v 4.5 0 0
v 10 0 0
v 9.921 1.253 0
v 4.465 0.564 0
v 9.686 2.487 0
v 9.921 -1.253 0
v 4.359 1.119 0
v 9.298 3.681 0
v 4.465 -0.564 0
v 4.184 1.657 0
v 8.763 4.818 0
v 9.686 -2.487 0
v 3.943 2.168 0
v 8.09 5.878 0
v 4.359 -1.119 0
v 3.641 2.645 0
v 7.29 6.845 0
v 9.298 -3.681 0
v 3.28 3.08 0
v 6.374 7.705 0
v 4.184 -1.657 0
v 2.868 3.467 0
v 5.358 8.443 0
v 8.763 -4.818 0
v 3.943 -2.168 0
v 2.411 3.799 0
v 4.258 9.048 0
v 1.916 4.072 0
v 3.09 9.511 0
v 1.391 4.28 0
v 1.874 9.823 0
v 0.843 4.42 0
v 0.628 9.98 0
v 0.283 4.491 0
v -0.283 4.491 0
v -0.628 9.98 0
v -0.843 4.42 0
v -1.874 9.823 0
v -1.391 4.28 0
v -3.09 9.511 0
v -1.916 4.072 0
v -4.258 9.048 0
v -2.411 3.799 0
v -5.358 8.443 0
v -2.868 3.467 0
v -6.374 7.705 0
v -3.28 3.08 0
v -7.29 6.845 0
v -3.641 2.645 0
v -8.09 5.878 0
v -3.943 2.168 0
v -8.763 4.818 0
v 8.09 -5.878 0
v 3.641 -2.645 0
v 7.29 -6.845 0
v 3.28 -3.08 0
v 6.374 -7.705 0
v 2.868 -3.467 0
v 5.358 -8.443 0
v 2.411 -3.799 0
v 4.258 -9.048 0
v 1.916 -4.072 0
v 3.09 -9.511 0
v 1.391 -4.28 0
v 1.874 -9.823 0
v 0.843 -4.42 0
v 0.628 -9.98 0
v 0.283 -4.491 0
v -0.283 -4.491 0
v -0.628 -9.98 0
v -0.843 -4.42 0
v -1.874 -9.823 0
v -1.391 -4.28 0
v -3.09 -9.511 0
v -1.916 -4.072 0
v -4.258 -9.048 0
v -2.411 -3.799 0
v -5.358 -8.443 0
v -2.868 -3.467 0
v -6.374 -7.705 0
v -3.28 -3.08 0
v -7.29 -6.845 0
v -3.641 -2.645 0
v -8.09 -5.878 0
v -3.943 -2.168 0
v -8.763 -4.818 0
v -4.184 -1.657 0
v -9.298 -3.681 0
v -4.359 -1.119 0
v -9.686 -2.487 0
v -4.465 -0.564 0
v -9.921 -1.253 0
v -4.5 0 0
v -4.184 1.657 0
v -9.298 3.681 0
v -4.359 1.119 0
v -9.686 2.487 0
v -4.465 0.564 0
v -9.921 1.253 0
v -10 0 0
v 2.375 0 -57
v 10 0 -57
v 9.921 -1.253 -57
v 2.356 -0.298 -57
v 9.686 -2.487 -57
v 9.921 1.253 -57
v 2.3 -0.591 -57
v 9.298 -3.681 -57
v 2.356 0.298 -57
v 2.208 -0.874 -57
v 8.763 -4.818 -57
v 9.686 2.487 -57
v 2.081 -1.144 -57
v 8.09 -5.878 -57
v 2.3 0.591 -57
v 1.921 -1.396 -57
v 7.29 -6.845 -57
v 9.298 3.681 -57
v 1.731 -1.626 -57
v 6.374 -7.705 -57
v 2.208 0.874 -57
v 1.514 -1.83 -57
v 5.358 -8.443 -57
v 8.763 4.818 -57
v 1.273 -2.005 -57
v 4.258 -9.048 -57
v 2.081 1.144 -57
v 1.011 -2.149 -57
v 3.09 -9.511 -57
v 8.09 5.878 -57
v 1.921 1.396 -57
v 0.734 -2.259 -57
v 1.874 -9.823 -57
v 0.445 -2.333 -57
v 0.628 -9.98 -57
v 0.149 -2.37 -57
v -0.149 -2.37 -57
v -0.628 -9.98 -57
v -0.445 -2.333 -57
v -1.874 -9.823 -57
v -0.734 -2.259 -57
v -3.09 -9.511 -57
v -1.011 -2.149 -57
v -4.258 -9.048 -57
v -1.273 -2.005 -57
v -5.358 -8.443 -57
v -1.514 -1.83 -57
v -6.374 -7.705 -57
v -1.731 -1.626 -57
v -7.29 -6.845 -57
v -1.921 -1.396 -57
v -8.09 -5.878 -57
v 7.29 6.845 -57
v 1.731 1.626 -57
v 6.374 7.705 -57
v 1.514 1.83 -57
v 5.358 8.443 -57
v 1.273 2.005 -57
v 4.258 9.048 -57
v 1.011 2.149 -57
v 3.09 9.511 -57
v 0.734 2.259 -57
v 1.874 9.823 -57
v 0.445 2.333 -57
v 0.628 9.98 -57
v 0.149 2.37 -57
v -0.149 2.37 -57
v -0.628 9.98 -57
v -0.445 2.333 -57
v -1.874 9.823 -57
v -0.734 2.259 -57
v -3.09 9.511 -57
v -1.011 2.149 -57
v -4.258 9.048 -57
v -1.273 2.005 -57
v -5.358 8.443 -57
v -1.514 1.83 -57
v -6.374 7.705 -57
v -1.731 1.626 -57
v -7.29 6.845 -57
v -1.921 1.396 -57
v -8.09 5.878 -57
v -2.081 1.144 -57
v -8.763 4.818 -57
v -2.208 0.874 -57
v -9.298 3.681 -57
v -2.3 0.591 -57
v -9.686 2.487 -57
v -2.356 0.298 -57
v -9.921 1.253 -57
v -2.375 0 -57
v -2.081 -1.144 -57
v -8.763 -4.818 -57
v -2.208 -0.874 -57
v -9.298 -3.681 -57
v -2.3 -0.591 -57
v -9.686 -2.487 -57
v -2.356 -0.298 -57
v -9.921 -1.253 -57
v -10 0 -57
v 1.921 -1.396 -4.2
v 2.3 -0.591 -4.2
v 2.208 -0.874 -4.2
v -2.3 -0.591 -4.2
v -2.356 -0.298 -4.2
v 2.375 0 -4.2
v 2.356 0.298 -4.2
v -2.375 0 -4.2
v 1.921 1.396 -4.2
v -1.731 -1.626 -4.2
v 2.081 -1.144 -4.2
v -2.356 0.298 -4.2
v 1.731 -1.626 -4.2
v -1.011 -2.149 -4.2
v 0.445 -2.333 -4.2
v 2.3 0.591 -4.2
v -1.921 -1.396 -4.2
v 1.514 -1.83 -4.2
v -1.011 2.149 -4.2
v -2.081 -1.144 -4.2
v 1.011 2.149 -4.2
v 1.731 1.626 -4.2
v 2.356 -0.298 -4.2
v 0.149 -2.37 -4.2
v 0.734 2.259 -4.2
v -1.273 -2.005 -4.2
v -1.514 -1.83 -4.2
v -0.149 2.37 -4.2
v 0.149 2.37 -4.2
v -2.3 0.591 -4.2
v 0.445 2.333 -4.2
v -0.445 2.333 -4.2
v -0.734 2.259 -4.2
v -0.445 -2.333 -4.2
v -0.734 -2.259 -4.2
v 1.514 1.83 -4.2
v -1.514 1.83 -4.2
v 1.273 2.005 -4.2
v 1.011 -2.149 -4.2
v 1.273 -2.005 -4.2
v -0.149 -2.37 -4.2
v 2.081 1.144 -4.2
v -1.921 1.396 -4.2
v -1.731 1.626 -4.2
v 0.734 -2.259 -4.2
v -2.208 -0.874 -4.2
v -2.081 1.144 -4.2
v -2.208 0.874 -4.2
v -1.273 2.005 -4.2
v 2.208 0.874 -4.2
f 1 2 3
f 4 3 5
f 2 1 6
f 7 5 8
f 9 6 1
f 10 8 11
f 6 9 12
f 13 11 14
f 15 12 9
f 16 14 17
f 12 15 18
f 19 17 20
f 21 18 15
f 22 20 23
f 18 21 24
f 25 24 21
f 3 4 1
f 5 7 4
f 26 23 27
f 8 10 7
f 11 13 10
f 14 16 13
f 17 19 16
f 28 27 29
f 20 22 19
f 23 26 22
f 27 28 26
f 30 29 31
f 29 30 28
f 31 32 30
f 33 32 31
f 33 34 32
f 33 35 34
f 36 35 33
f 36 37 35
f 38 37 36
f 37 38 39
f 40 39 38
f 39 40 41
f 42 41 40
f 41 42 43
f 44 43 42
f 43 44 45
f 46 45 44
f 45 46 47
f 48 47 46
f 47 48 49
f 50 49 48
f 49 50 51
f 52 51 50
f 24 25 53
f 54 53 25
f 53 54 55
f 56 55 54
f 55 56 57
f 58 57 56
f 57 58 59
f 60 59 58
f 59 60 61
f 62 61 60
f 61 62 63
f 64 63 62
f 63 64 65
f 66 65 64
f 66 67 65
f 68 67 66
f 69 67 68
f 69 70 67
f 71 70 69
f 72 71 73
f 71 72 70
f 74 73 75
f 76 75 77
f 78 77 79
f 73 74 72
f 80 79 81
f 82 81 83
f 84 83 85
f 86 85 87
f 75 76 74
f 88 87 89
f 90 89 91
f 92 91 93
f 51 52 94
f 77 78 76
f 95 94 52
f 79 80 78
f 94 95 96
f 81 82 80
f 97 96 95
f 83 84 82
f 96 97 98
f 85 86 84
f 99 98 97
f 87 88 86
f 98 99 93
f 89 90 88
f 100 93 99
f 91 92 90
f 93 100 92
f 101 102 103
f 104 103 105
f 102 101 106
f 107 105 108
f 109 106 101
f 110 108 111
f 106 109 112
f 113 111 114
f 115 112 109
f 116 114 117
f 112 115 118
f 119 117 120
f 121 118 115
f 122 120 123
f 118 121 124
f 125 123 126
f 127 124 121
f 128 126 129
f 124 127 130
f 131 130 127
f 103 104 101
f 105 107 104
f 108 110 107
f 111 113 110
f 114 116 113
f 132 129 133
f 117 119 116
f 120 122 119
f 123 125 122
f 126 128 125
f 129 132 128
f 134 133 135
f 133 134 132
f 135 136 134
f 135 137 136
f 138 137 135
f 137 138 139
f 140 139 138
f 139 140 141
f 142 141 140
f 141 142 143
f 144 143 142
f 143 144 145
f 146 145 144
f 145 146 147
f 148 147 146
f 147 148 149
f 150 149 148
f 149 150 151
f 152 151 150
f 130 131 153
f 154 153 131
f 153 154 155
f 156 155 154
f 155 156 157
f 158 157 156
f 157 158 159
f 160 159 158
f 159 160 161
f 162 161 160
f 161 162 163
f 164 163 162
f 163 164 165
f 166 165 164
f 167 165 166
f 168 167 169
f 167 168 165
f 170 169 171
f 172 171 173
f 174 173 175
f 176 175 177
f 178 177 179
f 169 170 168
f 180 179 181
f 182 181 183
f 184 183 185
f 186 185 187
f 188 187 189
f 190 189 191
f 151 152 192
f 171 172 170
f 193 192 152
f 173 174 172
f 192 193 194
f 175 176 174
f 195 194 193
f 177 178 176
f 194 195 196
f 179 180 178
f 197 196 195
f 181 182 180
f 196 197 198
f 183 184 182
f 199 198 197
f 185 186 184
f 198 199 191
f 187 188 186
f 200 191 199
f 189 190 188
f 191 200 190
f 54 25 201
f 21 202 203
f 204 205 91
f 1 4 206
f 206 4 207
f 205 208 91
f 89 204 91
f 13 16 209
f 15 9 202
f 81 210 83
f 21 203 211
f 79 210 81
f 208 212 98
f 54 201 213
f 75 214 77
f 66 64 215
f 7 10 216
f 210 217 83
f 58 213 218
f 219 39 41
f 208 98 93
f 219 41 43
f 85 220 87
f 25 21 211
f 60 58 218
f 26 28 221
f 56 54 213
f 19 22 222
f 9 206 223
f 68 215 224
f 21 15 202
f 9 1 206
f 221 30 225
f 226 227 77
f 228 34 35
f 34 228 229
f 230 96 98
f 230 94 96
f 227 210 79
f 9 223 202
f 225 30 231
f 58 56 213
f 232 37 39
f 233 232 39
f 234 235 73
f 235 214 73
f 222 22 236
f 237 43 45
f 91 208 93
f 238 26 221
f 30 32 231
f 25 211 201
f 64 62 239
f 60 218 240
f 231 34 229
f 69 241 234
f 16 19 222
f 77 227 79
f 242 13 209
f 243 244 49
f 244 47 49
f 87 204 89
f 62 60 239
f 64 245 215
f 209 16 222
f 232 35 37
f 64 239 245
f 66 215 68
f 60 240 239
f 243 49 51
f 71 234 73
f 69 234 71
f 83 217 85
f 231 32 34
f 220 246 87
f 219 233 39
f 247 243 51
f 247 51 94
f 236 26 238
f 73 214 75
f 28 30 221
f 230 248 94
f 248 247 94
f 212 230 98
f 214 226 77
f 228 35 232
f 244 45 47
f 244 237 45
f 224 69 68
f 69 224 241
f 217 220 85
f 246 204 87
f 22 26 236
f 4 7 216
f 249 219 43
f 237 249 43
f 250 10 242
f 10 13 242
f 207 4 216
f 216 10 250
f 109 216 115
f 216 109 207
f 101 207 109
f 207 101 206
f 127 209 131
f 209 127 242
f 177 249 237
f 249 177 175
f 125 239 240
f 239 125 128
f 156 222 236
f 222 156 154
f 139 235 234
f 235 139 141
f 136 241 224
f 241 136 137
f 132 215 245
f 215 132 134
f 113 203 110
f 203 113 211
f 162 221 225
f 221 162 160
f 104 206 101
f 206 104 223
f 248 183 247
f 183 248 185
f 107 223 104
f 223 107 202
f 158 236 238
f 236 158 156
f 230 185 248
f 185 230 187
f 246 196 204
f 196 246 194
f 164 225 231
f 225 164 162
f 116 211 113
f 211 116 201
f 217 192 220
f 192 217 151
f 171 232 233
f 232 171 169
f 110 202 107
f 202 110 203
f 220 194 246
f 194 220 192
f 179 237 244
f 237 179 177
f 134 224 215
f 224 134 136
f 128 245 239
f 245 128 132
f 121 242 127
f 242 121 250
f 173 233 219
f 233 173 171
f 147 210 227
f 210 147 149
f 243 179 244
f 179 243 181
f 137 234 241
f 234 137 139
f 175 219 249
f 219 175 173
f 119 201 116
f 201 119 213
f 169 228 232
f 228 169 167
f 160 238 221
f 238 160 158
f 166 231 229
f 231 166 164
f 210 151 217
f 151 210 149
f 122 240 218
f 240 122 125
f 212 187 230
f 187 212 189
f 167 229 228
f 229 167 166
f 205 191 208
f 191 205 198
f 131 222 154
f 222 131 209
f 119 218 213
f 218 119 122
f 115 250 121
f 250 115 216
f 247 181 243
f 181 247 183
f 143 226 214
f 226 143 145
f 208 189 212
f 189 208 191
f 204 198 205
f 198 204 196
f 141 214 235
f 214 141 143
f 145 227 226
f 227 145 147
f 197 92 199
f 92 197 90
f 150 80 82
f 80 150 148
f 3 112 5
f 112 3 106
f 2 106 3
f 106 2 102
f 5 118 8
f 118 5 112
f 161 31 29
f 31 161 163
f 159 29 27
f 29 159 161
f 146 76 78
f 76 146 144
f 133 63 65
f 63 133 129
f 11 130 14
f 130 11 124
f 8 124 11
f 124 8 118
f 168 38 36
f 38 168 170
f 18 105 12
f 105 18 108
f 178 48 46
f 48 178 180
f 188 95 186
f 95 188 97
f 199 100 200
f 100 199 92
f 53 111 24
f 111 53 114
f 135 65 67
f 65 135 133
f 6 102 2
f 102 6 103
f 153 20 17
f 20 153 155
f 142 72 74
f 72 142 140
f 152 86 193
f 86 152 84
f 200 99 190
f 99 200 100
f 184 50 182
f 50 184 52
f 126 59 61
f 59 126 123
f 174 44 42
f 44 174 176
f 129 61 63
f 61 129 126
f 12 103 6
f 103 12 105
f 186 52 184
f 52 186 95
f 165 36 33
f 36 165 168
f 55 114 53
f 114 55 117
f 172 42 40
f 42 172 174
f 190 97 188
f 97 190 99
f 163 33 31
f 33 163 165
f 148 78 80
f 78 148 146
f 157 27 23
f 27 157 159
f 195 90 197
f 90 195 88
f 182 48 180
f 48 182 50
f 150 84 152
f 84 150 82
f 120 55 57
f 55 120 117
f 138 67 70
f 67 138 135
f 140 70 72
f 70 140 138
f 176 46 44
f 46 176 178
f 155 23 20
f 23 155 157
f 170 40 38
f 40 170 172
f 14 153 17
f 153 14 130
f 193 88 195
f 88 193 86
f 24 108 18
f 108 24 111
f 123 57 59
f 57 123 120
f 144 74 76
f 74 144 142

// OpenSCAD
$fn = 50;


difference() {
	union() {
		translate(v = [0, 0, -57.0000000000]) {
			cylinder(h = 57, r = 10.0000000000);
		}
		cylinder(h = 0, r = 19.0000000000);
	}
	union() {
		translate(v = [0, 0, 0]) {
			rotate(a = [0, 0, 0]) {
				difference() {
					union() {
						#translate(v = [0, 0, -57.0000000000]) {
							cylinder(h = 57, r = 2.2500000000);
						}
						#translate(v = [0, 0, -4.2000000000]) {
							cylinder(h = 4.2000000000, r1 = 2.3750000000, r2 = 4.5000000000);
						}
						#translate(v = [0, 0, -57.0000000000]) {
							cylinder(h = 57, r = 2.3750000000);
						}
						#translate(v = [0, 0, -57.0000000000]) {
							cylinder(h = 57, r = 2.2500000000);
						}
					}
					union();
				}
			}
		}
	}
}
